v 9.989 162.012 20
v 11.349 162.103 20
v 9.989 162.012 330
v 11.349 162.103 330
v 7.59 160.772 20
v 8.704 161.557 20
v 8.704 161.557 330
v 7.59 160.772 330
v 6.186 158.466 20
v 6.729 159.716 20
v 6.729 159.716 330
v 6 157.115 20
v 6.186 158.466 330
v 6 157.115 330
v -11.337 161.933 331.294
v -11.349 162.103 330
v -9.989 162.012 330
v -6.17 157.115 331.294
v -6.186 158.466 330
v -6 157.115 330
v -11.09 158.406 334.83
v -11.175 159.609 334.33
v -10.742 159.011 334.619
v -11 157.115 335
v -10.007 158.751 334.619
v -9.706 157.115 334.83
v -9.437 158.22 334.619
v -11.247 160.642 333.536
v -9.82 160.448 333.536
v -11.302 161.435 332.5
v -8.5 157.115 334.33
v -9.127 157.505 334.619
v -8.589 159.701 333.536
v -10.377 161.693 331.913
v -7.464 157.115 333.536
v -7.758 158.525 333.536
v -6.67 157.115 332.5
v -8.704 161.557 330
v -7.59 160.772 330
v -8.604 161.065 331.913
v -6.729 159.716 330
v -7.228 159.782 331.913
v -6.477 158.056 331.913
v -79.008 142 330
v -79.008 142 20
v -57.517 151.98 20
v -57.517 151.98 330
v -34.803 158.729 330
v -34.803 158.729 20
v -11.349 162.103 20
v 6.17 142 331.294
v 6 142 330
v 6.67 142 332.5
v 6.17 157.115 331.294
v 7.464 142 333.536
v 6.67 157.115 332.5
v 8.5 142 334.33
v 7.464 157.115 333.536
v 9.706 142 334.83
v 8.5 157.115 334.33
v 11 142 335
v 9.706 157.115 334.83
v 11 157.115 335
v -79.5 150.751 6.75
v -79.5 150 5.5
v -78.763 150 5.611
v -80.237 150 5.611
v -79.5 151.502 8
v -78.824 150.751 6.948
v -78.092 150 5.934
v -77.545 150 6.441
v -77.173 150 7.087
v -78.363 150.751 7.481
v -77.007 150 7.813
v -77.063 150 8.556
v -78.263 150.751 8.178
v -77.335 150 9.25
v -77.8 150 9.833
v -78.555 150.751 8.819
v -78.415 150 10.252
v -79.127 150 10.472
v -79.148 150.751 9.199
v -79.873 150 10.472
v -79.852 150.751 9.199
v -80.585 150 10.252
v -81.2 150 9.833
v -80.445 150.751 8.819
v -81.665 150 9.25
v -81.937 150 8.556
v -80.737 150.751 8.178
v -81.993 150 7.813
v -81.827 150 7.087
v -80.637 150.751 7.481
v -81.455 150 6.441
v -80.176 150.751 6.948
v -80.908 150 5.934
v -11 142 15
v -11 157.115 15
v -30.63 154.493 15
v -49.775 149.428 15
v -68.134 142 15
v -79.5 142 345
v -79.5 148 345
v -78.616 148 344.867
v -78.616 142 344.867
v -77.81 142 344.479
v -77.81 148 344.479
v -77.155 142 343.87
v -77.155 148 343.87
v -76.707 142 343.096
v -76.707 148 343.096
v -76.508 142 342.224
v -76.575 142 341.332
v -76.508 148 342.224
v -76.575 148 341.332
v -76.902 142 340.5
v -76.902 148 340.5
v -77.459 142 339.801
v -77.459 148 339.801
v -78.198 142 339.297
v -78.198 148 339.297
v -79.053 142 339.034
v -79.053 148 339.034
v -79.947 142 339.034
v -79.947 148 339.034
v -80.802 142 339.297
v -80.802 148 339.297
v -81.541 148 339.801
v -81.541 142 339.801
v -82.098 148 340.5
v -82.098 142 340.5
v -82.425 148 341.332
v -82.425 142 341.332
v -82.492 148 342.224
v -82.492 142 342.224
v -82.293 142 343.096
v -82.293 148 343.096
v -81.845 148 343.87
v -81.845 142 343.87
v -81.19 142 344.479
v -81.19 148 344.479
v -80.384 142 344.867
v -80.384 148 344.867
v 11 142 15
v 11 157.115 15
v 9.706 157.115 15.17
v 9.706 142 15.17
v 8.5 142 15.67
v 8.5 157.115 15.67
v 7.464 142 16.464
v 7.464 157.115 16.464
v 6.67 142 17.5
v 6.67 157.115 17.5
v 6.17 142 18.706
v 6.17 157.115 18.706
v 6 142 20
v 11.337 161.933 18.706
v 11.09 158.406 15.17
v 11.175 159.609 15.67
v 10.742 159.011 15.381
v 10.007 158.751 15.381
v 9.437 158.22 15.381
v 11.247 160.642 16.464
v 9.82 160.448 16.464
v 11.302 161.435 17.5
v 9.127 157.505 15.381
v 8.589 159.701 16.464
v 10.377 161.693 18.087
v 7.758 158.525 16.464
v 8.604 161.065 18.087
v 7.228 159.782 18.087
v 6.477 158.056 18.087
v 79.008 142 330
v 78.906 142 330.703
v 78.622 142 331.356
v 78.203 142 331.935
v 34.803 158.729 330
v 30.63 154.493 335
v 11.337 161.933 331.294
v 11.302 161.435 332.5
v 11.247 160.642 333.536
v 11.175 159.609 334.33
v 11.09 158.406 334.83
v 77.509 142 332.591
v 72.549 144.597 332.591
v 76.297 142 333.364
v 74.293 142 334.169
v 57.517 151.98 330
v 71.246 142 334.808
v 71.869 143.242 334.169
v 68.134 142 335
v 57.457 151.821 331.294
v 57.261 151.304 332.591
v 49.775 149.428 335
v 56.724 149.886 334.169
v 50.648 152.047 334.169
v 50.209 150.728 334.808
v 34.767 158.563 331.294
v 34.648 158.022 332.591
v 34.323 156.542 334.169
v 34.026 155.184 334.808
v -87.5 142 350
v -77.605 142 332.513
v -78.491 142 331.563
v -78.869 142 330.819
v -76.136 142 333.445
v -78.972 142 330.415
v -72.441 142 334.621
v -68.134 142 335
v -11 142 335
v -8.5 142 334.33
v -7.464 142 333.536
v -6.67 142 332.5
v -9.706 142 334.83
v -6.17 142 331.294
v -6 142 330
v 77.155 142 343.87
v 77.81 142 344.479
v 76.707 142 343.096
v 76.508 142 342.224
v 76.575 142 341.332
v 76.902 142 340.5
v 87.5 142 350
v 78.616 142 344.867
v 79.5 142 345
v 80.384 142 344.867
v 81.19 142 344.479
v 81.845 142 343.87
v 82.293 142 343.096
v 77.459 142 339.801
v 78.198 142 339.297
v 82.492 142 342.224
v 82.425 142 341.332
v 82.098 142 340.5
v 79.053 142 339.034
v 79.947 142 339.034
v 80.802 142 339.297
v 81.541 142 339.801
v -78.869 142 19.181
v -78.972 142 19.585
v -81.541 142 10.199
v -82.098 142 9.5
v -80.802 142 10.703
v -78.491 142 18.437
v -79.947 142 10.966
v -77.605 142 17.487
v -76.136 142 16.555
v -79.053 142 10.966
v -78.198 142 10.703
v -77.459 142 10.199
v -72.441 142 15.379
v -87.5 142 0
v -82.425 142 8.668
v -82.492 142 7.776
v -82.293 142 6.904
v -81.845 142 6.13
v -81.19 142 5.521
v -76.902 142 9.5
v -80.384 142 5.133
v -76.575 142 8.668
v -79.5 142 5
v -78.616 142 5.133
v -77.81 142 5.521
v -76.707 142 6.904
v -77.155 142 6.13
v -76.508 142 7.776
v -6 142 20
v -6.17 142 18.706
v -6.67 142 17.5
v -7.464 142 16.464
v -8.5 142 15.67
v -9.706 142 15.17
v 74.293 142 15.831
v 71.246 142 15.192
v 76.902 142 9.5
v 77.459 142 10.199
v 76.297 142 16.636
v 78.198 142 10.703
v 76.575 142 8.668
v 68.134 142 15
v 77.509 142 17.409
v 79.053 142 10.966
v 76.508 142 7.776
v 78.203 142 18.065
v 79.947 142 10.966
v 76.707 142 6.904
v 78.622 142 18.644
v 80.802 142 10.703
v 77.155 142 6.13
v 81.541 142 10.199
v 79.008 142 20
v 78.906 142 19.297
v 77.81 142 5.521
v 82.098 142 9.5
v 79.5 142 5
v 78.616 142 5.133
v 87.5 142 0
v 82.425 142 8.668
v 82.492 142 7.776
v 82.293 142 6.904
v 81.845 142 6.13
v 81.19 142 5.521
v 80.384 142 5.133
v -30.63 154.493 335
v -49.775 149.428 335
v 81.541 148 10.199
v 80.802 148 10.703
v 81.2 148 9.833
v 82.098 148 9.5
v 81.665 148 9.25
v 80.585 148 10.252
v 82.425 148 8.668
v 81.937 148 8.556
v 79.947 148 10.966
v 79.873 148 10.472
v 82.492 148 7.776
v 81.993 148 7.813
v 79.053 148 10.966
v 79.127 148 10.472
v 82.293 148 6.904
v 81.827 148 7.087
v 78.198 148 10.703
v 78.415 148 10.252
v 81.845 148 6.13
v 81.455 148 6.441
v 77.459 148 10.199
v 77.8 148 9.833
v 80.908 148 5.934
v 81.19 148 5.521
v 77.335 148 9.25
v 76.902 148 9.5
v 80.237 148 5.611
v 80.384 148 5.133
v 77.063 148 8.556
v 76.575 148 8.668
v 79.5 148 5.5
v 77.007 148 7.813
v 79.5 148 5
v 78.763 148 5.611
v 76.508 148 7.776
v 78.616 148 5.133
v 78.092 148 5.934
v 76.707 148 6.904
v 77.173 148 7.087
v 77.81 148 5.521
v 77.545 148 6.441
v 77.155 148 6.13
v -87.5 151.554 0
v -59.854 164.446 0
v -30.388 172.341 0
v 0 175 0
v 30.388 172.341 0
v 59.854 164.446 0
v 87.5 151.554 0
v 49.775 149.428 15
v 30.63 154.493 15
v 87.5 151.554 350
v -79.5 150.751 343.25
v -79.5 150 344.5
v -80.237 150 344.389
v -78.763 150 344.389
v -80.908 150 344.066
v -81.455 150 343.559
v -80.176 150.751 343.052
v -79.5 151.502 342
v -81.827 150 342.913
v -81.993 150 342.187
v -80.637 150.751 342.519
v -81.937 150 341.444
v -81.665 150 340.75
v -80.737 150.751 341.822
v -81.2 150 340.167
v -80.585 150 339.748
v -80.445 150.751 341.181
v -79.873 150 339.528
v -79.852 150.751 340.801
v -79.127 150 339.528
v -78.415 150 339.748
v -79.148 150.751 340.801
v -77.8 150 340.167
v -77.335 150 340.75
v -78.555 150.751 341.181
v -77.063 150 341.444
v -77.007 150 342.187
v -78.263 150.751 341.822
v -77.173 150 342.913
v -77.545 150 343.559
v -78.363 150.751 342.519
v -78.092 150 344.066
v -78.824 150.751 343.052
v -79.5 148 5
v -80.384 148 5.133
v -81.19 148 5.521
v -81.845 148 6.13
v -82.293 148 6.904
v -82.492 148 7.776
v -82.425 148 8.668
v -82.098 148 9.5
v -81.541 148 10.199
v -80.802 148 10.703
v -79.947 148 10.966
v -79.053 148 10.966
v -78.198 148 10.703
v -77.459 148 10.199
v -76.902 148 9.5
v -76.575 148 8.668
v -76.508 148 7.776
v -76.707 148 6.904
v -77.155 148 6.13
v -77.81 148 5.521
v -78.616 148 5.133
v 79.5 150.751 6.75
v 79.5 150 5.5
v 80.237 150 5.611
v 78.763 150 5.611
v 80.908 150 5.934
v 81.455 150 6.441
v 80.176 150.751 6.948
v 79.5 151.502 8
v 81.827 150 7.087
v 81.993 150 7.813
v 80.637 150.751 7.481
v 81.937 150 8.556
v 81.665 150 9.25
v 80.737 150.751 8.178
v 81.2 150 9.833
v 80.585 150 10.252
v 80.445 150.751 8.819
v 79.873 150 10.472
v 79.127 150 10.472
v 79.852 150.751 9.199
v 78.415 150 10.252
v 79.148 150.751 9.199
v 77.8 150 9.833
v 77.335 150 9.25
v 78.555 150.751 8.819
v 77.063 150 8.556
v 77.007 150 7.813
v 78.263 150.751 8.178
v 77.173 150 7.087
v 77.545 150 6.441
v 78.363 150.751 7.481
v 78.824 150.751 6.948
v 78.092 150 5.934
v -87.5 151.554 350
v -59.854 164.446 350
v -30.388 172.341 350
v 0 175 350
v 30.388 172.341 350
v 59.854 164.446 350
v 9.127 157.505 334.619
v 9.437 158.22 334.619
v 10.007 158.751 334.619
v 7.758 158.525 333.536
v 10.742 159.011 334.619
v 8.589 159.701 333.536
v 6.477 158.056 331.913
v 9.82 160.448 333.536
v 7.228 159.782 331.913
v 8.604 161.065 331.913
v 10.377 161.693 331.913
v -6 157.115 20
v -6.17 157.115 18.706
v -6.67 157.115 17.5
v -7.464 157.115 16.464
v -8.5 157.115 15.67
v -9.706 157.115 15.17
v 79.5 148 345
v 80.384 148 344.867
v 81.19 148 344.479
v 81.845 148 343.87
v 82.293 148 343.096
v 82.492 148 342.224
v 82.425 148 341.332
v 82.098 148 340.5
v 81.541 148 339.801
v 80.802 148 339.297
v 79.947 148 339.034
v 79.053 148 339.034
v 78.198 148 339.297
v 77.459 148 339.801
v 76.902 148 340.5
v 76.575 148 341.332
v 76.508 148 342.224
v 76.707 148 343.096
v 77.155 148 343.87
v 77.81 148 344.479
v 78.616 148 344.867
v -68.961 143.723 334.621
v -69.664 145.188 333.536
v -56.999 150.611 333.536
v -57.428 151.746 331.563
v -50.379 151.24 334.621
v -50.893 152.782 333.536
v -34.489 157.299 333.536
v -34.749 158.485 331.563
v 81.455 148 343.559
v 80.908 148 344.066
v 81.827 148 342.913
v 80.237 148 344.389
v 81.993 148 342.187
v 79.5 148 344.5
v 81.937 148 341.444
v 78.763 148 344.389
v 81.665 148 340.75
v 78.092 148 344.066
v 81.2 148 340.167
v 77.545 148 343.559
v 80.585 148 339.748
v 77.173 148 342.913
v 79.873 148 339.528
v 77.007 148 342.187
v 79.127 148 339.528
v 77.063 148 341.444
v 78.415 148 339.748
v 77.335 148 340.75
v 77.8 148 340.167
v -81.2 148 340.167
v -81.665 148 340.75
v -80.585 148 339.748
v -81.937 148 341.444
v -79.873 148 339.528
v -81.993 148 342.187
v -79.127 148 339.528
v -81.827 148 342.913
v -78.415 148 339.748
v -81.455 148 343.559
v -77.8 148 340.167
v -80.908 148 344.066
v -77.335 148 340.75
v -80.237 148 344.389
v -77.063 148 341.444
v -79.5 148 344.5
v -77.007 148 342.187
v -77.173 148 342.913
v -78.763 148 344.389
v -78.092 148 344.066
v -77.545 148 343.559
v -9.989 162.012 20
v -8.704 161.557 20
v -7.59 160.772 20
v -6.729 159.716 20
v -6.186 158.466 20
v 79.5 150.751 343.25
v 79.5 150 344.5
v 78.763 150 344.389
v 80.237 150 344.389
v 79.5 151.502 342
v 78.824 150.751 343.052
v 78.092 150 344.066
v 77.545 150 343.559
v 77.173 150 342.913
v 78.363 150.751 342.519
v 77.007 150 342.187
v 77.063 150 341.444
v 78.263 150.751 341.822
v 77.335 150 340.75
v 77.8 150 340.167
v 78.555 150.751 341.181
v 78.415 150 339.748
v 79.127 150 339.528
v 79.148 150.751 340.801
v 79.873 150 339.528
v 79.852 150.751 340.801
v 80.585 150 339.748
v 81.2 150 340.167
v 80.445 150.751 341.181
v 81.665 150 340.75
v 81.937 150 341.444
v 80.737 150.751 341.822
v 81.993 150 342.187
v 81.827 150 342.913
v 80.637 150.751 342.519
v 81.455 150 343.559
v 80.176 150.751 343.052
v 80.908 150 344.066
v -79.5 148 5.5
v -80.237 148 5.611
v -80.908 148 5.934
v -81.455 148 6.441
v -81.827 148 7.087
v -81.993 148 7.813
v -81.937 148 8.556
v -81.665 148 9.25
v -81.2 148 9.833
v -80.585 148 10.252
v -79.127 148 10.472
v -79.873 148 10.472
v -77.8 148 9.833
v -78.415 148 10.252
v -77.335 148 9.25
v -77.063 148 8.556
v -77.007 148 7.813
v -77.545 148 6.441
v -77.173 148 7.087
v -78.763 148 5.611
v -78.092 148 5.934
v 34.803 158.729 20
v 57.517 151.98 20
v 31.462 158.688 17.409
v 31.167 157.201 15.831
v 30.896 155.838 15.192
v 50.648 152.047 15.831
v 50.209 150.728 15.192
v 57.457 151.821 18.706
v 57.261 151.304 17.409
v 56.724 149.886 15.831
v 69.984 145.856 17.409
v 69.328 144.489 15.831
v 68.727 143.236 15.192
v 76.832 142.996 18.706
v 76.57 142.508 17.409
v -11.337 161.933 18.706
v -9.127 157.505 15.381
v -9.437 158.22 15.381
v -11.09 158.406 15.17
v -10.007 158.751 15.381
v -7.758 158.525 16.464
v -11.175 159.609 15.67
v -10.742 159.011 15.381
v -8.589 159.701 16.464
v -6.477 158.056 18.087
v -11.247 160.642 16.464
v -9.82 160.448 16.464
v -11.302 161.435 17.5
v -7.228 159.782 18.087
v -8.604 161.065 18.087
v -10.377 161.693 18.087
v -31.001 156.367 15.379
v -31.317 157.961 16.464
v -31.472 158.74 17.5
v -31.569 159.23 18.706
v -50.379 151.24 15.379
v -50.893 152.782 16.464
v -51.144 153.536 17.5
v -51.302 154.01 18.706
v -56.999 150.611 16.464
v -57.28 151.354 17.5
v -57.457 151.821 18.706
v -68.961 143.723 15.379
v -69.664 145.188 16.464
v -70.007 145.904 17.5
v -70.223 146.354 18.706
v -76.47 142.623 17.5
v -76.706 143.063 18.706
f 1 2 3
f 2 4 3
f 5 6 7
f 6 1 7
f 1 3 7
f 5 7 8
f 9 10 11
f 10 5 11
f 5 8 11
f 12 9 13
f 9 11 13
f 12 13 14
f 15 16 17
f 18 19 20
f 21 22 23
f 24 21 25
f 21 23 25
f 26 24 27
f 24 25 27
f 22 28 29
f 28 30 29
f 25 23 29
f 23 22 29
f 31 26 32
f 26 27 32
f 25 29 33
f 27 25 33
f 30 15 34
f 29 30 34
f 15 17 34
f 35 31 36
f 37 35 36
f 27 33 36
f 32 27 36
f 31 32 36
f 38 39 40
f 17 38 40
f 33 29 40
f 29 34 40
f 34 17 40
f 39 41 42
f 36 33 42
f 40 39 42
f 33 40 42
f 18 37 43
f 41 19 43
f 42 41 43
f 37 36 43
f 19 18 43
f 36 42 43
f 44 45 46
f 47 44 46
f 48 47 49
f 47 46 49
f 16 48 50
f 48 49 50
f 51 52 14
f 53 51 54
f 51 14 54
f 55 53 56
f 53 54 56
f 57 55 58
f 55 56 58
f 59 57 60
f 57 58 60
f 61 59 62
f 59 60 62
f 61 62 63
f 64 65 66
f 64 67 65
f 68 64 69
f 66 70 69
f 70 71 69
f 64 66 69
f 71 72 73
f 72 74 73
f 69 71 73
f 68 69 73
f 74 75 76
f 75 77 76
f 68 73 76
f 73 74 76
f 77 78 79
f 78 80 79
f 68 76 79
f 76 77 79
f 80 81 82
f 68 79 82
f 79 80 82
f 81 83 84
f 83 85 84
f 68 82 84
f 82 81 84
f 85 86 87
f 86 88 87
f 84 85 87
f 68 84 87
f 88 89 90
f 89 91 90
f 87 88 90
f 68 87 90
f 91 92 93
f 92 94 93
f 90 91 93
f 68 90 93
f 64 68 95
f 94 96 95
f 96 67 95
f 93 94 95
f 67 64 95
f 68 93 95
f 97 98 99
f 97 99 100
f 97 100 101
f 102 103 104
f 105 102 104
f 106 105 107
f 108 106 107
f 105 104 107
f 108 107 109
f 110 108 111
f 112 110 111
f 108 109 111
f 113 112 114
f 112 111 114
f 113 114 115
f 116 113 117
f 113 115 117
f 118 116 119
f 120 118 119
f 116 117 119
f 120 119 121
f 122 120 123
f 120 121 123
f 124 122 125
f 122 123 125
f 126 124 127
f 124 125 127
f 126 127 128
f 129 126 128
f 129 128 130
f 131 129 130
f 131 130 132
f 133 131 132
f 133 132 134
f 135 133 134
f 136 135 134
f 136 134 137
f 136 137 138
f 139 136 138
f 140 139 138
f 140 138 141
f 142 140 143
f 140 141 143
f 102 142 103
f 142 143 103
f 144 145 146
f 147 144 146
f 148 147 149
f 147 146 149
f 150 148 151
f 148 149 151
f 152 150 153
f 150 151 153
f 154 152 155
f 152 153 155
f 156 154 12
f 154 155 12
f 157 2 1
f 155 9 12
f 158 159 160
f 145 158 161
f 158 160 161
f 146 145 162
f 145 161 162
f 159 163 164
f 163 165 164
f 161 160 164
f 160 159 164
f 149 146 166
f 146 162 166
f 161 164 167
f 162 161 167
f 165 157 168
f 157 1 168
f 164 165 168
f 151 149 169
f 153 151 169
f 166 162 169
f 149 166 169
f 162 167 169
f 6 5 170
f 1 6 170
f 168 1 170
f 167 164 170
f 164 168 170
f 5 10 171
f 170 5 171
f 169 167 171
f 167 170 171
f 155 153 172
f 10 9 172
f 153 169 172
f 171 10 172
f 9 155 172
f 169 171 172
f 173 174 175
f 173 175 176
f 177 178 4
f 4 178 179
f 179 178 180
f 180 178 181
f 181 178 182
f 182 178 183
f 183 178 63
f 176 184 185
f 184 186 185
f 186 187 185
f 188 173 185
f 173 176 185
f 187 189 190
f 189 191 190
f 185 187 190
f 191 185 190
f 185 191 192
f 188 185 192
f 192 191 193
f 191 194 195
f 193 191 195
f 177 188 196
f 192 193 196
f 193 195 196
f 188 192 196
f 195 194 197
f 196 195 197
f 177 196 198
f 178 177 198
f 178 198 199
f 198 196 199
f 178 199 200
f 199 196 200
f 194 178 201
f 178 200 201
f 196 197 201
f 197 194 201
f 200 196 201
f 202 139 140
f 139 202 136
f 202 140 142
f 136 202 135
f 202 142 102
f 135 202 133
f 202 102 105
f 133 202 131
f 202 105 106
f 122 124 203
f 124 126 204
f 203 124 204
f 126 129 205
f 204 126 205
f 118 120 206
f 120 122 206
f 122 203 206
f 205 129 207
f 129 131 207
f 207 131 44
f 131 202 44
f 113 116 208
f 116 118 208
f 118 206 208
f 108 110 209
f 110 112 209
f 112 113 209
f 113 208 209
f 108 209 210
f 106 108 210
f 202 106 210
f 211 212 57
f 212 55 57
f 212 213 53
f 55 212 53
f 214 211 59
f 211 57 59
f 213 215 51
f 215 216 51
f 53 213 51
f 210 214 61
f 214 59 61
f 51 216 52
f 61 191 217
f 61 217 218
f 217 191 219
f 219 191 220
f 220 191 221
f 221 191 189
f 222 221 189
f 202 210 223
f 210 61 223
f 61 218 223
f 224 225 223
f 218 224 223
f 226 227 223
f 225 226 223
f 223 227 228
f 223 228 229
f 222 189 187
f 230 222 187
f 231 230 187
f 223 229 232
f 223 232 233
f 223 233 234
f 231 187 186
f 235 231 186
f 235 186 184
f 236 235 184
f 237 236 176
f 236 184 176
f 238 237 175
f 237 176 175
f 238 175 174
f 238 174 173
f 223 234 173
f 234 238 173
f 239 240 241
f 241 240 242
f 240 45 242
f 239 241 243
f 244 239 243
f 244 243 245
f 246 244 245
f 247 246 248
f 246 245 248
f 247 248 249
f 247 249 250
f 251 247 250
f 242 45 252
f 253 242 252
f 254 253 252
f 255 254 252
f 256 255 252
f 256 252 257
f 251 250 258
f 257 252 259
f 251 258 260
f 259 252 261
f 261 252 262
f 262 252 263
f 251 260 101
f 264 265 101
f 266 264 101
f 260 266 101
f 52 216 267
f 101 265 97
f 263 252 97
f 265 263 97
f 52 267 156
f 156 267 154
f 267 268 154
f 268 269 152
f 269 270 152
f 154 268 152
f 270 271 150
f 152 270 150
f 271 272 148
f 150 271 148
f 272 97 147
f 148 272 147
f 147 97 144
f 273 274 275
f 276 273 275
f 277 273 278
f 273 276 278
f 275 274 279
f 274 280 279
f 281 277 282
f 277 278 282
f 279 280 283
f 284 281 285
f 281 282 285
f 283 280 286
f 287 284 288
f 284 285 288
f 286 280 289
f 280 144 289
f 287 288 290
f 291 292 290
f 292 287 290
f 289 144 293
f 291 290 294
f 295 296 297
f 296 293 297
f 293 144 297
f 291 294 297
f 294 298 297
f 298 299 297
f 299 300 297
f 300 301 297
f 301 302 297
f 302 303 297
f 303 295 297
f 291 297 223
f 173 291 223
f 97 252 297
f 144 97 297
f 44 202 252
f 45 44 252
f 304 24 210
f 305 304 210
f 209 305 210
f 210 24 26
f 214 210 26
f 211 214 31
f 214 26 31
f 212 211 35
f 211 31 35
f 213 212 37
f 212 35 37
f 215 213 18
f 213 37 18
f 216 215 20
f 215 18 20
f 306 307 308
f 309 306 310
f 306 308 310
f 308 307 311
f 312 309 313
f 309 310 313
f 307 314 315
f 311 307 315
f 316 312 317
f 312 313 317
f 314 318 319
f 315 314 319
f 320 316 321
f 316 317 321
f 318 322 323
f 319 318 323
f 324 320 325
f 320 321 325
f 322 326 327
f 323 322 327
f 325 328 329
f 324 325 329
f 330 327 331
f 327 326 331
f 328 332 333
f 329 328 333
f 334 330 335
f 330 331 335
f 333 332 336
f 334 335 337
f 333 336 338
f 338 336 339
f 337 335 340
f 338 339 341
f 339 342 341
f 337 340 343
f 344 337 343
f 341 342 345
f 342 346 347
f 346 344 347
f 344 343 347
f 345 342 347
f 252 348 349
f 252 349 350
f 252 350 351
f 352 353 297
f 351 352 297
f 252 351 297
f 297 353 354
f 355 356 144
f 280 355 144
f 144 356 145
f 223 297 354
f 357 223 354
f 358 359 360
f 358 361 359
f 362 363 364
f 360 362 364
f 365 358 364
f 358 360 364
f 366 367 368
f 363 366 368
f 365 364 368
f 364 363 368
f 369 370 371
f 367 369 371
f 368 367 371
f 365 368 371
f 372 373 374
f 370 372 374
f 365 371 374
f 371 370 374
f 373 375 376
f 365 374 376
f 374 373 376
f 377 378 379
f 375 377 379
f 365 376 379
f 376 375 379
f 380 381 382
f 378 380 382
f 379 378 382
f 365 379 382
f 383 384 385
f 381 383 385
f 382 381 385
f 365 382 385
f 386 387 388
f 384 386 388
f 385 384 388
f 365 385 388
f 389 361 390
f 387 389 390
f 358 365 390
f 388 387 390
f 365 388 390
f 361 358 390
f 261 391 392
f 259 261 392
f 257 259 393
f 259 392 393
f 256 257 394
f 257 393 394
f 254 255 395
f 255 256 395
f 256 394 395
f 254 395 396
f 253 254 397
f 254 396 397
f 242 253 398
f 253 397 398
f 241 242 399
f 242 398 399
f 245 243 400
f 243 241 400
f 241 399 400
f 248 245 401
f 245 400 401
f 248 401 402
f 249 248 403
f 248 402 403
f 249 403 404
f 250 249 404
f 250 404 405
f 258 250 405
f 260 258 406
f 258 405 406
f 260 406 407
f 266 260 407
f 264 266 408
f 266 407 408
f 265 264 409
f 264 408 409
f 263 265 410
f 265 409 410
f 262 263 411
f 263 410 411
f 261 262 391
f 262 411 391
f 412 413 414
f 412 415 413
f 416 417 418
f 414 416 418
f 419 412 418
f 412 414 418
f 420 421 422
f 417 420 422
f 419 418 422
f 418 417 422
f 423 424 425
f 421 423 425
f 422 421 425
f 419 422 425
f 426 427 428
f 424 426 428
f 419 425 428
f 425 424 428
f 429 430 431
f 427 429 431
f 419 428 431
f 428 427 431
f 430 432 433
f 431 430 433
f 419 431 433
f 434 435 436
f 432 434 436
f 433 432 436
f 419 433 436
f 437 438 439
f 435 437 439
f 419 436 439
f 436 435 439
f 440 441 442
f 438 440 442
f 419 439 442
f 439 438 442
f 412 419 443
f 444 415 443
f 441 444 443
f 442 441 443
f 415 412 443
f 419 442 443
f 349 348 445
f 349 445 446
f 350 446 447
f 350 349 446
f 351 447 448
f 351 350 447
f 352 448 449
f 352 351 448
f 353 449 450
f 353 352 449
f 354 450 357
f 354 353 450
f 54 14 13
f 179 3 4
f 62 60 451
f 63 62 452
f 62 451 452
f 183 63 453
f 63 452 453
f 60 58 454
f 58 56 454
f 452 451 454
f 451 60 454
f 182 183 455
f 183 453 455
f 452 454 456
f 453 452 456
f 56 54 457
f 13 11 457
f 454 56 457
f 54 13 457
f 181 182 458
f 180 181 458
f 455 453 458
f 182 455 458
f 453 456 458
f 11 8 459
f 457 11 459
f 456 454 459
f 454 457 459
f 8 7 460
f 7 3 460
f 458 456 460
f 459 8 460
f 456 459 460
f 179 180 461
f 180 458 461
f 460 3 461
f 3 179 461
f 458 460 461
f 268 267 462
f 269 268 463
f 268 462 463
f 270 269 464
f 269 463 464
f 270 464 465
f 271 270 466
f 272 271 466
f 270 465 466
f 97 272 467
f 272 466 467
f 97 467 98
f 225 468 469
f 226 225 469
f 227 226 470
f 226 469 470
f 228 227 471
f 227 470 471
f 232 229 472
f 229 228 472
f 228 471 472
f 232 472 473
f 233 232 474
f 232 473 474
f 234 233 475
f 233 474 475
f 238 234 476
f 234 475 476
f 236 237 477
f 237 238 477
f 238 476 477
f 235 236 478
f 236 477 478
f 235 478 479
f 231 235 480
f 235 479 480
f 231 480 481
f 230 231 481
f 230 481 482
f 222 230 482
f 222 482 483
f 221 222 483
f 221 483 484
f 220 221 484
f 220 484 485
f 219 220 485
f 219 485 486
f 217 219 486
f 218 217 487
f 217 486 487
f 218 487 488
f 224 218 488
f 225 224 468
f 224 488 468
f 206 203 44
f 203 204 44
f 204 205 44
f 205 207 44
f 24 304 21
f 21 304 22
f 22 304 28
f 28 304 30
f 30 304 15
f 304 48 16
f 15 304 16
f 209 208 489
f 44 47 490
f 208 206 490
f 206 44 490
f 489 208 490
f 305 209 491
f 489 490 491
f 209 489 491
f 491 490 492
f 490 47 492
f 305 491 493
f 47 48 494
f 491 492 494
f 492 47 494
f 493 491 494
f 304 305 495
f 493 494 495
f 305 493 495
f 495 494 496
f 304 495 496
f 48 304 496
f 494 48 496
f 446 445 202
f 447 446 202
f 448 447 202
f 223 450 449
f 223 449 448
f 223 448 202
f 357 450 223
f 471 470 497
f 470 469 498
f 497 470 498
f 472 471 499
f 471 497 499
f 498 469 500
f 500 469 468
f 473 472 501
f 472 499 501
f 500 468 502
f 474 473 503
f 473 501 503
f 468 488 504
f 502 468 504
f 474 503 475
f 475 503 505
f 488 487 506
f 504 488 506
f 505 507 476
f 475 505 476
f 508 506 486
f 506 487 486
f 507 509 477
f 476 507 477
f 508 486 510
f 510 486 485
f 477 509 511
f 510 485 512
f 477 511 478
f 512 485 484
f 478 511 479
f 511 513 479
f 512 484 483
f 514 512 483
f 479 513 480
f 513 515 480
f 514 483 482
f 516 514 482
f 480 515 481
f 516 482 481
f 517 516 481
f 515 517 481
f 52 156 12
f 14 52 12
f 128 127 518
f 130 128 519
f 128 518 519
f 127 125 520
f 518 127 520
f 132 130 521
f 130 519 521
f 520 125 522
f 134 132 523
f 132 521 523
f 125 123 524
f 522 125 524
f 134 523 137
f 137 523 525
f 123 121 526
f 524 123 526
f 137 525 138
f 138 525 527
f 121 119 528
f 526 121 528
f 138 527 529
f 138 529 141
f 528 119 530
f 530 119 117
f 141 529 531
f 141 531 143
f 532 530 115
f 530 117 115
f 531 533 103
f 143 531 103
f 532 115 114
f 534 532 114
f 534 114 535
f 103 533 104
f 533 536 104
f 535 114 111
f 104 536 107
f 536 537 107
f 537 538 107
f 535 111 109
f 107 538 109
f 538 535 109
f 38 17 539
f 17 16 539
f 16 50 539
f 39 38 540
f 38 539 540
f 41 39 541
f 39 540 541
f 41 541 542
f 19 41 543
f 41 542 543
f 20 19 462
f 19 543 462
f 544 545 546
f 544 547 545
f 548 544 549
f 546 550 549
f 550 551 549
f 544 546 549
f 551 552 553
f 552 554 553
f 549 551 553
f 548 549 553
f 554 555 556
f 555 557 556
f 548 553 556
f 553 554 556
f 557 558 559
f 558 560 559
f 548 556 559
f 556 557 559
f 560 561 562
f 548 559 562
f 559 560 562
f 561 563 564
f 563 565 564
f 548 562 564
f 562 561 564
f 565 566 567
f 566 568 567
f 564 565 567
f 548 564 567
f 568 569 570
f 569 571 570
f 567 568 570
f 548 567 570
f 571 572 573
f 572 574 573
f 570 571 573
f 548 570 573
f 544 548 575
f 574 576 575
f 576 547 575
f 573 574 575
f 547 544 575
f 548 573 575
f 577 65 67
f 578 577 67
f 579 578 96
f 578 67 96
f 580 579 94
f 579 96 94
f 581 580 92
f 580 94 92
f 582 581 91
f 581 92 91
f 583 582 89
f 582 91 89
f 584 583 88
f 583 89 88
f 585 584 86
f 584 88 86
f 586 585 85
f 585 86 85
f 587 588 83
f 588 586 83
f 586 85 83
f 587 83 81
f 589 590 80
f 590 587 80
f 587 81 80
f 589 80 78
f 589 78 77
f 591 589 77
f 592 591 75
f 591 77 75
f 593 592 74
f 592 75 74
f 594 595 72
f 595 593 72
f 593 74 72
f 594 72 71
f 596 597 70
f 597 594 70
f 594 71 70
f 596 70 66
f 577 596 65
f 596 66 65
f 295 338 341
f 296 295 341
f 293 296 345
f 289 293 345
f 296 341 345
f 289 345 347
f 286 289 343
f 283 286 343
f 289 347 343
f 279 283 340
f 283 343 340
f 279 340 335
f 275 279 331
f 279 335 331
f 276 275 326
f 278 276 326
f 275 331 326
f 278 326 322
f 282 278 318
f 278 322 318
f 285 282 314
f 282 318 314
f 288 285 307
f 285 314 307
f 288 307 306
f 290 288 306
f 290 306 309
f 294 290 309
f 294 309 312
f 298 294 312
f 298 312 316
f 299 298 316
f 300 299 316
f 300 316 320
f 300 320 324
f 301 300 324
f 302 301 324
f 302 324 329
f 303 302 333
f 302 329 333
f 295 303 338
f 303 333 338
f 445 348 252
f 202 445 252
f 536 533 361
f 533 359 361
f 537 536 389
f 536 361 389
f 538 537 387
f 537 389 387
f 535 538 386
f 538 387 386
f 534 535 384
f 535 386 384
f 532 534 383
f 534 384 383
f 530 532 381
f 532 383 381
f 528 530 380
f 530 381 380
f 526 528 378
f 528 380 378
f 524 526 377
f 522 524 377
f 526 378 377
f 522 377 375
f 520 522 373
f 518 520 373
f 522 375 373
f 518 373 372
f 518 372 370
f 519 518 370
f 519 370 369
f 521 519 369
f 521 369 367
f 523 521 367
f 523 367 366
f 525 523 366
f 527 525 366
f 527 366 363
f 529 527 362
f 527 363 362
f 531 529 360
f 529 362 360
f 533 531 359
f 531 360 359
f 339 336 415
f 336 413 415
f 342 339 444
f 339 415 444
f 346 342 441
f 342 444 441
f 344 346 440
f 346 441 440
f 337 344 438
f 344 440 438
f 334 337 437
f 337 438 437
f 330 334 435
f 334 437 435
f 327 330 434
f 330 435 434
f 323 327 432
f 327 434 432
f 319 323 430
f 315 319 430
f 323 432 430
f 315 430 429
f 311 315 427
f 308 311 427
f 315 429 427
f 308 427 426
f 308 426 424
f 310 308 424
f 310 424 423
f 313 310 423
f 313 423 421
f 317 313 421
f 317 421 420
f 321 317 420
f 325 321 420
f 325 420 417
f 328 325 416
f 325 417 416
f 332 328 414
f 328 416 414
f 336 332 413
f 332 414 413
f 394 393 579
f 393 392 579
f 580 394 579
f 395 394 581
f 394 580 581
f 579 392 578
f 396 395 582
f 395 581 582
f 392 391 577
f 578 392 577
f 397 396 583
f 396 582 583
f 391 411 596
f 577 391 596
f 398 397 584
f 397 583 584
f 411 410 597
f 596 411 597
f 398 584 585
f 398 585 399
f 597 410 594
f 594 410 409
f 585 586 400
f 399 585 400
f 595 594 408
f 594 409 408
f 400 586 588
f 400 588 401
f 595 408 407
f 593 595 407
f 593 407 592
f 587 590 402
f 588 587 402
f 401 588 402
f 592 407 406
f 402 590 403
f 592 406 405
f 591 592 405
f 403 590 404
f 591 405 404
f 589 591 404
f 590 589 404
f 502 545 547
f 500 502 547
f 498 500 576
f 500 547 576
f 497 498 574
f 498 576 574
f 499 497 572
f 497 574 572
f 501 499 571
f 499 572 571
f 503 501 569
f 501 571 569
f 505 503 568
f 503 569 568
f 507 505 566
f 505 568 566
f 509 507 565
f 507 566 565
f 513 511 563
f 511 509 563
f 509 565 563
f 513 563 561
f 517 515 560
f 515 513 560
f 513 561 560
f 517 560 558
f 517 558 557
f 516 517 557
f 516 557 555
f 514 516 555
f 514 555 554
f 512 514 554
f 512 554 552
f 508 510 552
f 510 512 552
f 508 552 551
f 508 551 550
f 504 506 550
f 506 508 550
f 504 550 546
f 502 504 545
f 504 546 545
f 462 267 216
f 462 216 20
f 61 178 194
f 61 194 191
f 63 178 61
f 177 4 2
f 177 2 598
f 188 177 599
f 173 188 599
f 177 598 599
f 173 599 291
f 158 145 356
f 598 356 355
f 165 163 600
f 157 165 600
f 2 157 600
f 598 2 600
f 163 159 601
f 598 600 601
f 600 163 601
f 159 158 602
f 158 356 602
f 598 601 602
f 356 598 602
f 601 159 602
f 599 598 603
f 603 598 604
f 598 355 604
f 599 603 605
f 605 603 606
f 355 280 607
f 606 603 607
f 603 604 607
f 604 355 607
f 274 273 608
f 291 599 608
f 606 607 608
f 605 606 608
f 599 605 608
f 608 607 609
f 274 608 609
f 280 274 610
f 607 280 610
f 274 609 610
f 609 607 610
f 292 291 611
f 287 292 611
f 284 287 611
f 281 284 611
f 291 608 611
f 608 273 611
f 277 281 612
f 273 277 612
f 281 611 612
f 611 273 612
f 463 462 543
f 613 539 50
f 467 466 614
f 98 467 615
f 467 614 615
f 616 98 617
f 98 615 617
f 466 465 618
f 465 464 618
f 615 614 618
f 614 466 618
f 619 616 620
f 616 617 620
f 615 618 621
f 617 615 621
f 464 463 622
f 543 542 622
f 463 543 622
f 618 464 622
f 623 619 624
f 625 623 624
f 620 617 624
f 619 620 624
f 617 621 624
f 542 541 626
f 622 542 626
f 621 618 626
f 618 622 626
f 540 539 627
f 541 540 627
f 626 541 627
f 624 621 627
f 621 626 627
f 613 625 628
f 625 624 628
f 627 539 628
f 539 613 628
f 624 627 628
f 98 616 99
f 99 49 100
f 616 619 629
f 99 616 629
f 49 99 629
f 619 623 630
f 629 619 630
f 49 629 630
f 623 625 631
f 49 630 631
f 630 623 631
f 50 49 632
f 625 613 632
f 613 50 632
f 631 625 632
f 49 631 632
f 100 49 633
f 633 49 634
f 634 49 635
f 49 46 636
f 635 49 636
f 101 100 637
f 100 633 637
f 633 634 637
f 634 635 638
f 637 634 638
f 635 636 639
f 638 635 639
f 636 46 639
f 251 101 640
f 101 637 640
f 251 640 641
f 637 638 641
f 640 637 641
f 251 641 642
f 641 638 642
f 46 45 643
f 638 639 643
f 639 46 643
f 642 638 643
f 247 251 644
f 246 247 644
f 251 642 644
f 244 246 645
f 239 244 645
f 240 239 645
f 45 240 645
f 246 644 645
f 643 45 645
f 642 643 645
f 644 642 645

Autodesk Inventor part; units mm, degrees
ref_plane "YZ Plane" through (0, 0, 0) normal (1, 0, 0) x (0, 1, 0)
sketch "Эскиз1" plane through (0, 0, 0) normal (0, 0, 1) x (1, 0, 0)
  circle A0 centre (0, 0) radius 175
  line L0 (0, 136) -> (87.5, 136)
  line L1 (87.5, 136) -> (-87.5, 136)
  line L2 (-87.5, 151.5544) -> (-87.5, 142)
  line L3 (-87.5, 142) -> (87.5, 142)
  line L4 (87.5, 142) -> (87.5, 151.5544)
  dimension "d0" = 350
  dimension "d1" = 87.5
  dimension "d2" = 175
  dimension "d13" = 142
extrude "Выдавливание1" add sketch "Эскиз1" along normal blind 350 contours L4 L3 L2 A0 picked at (0, 153)
ref_plane "РабПлоскость1" through (0, 0, 175) normal (0, 0, -1) x (-1, 0, 0)
sketch "Эскиз2" plane through (0, 0, 175) normal (0, 0, -1) x (-1, 0, 0)
  arc A0 (87.5, 151.5544) -> (-87.5, 151.5544) centre (0, 0) ccw projected
  line L0 (-87.5, 142) -> (-87.5, 151.5544) projected
  arc A1 (87.5, 151.5544) -> (-87.5, 151.5544) centre (0, 0) ccw projected
  line L1 (87.5, 151.5544) -> (87.5, 142) projected
  line L2 (87.5, 142) -> (-87.5, 142) projected
  circle A2 centre (0, 0) radius 162.5
  line L3 (87.5, 142) -> (-87.5, 142) projected
  line L4 (0, 142) -> (-6, 142)
  line L5 (-6, 142) -> (-6, 162.3892)
  line L6 (0, 142) -> (6, 142)
  line L7 (6, 142) -> (6, 162.3892)
  point P0 (-79.0079, 142)
  point P1 (79.0079, 142)
  dimension "d7" = 325
  dimension "d8" = 6
  dimension "d9" = 6
extrude "Выдавливание2" cut sketch "Эскиз2" against normal mid plane 320 contours L2 L7 A2 | A2 L5 L2
fillet "Сопряжение1" radius 5 10 edges at (-43.7095, 156.5111, 335) (43.7095, 156.5111, 335) (-6, 162.3892, 175) (-6, 152.1946, 335) (6, 162.3892, 175) (6, 152.1946, 335) (6, 152.1946, 15) (43.7095, 156.5111, 15) (-43.7095, 156.5111, 15) (-6, 152.1946, 15)
sketch "Эскиз3" plane through (-87.5, 142, 0) normal (0, -1, 0) x (1, 0, 0)
  line L0 (175, 0) -> (175, 8)
  line L1 (175, 0) -> (175, 350) projected
  line L2 (175, 8) -> (167, 8)
  dimension "d14" = 8
hole "Отверстие1" at (79.5, 142, 8) direction (0, 1, 0) diameter 5 depth 8 tip angle 118 counterbore diameter 6 counterbore depth 6
mirror "Зеркальное отражение1" about plane through (0, 0, 0) normal (1, 0, 0) of "Отверстие1"
ref_plane "РабПлоскость2" through (0, 0, 175) normal (0, 0, -1) x (-1, 0, 0)
mirror "Зеркальное отражение2" about plane through (0, 0, 175) normal (0, 0, -1) of "Отверстие1", "Зеркальное отражение1"
thread "Резьба1" size "M6x1" class "6H" standard "ANSI Metric M Profile" full length
thread "Резьба2" size "M6x1" class "6H" standard "ANSI Metric M Profile" full length
thread "Резьба3" size "M6x1" class "6H" standard "ANSI Metric M Profile" full length
thread "Резьба4" size "M6x1" class "6H" standard "ANSI Metric M Profile" full length
properties part number "Башмак_CPY" material "Бронза, мягкое олово"
